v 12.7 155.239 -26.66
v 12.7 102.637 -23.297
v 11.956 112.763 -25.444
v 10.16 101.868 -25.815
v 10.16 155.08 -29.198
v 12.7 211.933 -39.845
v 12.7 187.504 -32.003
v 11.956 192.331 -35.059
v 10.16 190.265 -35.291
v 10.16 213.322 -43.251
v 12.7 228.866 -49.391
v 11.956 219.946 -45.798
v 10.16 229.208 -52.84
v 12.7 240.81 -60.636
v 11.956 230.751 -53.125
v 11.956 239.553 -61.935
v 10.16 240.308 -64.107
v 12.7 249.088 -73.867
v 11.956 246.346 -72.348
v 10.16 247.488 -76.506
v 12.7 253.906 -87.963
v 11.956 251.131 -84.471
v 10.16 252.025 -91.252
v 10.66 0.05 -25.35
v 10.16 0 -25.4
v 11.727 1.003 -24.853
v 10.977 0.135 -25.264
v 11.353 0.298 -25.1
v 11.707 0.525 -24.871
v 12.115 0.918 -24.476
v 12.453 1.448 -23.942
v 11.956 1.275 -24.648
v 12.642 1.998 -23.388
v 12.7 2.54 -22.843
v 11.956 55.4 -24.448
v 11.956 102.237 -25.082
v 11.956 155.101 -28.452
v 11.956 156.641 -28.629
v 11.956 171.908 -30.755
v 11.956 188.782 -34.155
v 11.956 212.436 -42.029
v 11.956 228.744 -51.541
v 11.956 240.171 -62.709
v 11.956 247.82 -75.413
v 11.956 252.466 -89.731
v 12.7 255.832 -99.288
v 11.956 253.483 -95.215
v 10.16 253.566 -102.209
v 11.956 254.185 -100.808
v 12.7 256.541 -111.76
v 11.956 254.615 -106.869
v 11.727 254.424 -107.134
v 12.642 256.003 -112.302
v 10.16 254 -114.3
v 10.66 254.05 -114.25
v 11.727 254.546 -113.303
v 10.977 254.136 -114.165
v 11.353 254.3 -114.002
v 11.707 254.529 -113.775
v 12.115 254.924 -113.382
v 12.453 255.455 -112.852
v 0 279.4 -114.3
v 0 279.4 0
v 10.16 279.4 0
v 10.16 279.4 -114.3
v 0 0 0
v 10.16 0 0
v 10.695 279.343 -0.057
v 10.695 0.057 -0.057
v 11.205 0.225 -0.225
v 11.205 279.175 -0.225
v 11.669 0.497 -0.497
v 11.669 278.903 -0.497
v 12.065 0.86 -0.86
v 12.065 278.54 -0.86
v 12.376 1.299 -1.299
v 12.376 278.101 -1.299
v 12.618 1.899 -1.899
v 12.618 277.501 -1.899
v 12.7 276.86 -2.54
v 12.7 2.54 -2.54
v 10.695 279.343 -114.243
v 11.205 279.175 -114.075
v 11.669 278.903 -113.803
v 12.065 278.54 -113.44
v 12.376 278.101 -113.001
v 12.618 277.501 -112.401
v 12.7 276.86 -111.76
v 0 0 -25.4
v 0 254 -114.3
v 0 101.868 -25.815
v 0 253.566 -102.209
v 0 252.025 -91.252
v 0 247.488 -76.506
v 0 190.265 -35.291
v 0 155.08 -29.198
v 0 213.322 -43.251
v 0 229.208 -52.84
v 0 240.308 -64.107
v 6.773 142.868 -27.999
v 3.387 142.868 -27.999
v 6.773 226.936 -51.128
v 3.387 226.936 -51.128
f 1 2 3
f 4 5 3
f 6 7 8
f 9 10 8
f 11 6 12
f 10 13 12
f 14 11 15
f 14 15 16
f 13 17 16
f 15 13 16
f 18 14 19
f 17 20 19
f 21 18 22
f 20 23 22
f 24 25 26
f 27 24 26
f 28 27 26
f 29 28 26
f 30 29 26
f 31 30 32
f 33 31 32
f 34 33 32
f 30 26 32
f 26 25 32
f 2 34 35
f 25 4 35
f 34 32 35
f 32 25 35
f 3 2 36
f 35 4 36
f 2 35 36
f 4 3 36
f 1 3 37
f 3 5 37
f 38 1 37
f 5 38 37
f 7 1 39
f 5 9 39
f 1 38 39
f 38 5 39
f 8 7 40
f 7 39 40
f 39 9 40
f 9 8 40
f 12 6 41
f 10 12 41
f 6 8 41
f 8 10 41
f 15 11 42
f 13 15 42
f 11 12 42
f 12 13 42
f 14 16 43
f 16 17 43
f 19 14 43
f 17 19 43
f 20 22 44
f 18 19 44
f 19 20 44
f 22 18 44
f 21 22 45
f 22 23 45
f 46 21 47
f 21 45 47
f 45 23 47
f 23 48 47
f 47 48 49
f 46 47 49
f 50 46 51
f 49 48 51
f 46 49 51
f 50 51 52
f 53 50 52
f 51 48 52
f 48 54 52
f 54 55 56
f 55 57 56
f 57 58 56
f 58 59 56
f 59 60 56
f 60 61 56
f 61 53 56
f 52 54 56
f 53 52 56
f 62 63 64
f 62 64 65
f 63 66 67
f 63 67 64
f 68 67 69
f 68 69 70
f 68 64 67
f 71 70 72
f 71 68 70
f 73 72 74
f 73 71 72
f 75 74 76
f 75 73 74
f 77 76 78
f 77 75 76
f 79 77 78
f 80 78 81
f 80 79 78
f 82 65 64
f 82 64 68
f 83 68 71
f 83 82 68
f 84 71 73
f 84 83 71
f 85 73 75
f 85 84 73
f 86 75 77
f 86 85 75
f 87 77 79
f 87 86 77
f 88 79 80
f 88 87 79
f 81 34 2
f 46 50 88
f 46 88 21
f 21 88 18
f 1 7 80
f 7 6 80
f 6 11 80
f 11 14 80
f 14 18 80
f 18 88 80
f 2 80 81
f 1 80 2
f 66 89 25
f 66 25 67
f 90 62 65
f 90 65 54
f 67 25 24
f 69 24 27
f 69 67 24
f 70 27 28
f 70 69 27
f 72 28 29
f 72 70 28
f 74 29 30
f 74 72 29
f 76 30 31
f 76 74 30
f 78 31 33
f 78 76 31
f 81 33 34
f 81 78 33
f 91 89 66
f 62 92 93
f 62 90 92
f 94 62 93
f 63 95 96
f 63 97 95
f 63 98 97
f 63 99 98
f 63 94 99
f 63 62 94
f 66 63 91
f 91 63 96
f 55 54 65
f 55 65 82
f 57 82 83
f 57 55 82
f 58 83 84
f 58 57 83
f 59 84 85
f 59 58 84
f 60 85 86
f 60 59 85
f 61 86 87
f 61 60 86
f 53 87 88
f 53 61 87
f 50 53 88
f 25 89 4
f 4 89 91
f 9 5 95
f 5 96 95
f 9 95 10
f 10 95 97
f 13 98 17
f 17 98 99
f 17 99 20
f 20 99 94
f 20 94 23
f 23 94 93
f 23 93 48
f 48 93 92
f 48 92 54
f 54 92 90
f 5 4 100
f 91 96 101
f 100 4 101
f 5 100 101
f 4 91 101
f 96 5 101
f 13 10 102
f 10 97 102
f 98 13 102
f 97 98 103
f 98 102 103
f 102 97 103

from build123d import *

# Parameters (mm, degrees)
BOSS_EXTRUDE1_DEPTH = 12.7
FILLET1_R           = 2.54


with BuildPart() as part:
    # Sketch1 → Boss-Extrude1 (new body)
    with BuildSketch(Plane(origin=(0, 0, 0), x_dir=(0, 0, -1), z_dir=(1, 0, 0))):
        with BuildLine():
            Line((0, 0), (0, 279.4))
            Line((0, 279.4), (114.3, 279.4))
            Line((114.3, 279.4), (114.3, 254))
            add(Edge.make_bspline(
                [(25.4, 0), (24.239409863, 172.867425699), (24.601191912, 254.838281825), (114.3, 254)],
                knots=[0, 0, 0, 0, 1, 1, 1, 1], degree=3))
            Line((25.4, 0), (0, 0))
        make_face()
    extrude(amount=BOSS_EXTRUDE1_DEPTH)

    # Fillet1
    fillet1_edges = [part.edges().sort_by_distance(p)[0] for p in [
        (12.7, 266.7, -114.3),
        (12.7, 279.4, -57.15),
        (12.7, 139.7, 0),
        (12.7, 0, -12.7),
        (12.7, 192.139640321, -35.777725666),
    ]]
    fillet(fillet1_edges, radius=FILLET1_R - 0.0001)  # a hair under: the kernel refuses the full size


solid = part.part
